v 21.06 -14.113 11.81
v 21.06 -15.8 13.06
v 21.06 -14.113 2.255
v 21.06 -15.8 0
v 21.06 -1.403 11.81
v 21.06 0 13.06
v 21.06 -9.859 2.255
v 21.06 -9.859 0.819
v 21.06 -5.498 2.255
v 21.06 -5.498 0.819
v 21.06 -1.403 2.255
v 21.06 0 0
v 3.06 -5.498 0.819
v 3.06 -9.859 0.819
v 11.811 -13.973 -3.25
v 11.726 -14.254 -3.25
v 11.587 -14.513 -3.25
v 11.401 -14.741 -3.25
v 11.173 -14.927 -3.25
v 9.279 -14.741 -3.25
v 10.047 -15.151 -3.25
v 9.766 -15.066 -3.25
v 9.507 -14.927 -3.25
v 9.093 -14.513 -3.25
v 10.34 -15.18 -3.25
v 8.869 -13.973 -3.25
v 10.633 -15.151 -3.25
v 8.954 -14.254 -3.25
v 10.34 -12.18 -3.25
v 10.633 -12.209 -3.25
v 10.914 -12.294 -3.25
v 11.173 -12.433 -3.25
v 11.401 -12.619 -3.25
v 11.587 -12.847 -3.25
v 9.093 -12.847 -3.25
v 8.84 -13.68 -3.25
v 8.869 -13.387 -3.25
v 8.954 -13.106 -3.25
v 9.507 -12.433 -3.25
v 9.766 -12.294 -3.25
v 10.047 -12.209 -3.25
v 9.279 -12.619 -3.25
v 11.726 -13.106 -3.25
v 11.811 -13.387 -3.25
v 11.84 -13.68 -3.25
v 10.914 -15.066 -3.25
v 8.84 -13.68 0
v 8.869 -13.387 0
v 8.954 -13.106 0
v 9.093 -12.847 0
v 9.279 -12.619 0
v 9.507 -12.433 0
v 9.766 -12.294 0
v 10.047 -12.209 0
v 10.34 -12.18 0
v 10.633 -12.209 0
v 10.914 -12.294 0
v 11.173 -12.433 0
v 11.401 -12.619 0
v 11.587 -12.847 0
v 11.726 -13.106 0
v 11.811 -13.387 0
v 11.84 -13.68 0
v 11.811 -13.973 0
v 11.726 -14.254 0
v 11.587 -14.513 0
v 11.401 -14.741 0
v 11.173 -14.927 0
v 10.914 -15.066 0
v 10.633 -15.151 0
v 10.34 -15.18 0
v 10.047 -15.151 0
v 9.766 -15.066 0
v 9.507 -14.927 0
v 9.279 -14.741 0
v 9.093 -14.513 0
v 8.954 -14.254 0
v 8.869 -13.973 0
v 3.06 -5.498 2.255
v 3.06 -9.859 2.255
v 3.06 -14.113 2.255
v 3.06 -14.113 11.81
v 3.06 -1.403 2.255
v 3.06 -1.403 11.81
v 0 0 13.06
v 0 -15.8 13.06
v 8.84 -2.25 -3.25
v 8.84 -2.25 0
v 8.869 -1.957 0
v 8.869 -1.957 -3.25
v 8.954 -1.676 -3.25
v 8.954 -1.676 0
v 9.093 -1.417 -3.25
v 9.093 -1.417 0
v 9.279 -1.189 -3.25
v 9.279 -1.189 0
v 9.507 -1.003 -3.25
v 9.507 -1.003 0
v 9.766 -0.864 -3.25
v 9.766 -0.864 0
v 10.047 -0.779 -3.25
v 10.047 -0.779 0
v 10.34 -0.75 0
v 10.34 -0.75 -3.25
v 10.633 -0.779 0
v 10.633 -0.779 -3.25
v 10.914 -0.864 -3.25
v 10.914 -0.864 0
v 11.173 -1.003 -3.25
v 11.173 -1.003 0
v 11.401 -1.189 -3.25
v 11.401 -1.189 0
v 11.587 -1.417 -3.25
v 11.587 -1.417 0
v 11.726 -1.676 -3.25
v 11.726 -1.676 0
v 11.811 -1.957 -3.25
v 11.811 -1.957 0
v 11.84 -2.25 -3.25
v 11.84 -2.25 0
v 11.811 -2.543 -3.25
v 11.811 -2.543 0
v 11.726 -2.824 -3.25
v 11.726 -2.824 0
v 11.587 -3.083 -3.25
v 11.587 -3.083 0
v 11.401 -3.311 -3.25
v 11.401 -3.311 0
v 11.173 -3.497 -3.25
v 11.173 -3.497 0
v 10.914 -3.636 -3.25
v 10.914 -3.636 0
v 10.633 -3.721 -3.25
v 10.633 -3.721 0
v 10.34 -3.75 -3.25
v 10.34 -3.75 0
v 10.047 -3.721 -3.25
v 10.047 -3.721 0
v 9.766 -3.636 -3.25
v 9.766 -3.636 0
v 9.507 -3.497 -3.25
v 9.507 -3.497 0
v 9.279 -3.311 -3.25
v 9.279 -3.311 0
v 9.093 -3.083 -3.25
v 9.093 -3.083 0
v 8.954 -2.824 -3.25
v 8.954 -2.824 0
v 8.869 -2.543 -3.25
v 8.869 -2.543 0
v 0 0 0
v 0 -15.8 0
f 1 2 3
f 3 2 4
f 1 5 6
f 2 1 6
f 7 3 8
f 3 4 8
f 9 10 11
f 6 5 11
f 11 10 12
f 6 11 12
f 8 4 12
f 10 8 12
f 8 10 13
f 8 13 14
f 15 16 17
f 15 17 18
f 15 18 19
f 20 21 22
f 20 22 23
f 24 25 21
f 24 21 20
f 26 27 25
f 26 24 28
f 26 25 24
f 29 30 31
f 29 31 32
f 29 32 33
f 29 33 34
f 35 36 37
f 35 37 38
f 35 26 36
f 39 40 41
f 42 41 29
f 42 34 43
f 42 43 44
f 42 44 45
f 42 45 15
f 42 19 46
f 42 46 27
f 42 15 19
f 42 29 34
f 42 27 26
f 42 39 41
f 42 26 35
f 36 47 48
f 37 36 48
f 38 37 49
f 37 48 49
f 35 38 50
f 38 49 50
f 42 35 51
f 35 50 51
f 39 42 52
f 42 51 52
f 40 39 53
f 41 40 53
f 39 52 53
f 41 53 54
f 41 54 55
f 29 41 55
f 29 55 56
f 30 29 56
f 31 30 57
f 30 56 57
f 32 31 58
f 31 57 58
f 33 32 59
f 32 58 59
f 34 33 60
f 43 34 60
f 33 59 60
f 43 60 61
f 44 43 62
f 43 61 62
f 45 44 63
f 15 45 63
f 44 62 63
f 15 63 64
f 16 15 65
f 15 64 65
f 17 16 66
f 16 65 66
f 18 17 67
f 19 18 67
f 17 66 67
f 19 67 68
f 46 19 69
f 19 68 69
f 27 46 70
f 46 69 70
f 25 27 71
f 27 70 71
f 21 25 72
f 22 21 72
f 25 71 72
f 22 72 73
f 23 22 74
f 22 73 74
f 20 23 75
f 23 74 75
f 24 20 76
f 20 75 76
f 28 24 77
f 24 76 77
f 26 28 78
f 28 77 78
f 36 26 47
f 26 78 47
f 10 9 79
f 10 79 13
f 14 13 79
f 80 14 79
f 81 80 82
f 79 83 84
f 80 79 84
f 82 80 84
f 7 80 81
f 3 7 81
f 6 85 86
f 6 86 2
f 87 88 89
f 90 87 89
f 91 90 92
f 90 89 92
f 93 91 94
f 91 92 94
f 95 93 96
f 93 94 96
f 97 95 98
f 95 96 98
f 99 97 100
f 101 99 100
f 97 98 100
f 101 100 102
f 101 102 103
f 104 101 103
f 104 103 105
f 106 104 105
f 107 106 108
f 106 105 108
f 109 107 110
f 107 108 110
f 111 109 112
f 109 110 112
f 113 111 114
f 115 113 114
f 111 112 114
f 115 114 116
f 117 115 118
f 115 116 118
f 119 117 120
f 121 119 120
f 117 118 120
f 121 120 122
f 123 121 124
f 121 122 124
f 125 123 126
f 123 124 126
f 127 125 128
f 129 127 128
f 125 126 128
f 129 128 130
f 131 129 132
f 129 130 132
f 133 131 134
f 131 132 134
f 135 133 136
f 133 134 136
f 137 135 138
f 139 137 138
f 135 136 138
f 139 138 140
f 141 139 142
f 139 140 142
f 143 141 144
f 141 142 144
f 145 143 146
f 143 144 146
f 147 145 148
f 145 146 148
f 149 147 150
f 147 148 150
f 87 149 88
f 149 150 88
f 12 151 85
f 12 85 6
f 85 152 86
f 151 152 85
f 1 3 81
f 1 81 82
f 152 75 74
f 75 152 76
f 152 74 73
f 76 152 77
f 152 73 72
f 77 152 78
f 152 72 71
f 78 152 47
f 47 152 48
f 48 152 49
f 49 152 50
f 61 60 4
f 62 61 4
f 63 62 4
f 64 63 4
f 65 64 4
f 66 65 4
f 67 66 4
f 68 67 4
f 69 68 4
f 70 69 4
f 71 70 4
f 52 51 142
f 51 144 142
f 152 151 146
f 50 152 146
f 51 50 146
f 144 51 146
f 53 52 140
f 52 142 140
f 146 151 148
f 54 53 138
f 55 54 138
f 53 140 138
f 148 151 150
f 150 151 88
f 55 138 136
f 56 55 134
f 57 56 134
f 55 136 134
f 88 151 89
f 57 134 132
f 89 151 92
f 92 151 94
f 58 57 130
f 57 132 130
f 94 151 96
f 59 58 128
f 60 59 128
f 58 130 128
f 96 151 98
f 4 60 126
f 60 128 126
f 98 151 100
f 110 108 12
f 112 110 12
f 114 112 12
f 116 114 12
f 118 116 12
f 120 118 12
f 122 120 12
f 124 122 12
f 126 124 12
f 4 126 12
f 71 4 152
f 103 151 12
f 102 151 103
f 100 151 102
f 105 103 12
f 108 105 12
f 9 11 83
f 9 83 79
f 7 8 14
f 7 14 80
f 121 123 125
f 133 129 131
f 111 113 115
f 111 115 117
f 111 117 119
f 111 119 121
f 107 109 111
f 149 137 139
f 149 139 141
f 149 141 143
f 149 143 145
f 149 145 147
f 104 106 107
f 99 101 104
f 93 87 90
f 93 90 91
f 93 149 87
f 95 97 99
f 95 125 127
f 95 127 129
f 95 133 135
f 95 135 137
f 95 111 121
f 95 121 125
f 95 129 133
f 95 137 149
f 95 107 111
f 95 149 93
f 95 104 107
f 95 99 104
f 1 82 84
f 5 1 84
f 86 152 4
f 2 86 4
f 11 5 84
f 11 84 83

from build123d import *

# Parameters (mm, degrees)
SKETCH1_W          = 21.06
SKETCH1_H          = 15.8
EXTRUDE1_DEPTH     = 13.06
SKETCH2_R          = 1.5
EXTRUDE2_DEPTH     = 3.25
CUT_EXTRUDE1_DEPTH = 18


with BuildPart() as part:
    # Sketch1 → Extrude1 (new body)
    with BuildSketch(Plane.XY):
        with Locations((10.53, -7.9)):
            Rectangle(SKETCH1_W, SKETCH1_H)
    extrude(amount=EXTRUDE1_DEPTH)

    # Sketch2 → Extrude2 (add)
    with BuildSketch(Plane(origin=(0, 0, 0), x_dir=(-1, 0, 0), z_dir=(0, 0, -1))):
        with Locations((-10.34, -2.25)):
            Circle(SKETCH2_R)
        with Locations((-10.34, -13.68)):
            Circle(SKETCH2_R)
    extrude(amount=EXTRUDE2_DEPTH)

    # Sketch3 → Cut-Extrude1 (cut)
    with BuildSketch(Plane(origin=(21.06, 0, 0), x_dir=(0, 0, -1), z_dir=(1, 0, 0))):
        Polygon((-11.809509458, -14.113172182), (-11.809509458, -1.403202269), (-2.254873777, -1.403202269), (-2.254873777, -5.498046132), (-0.819019435, -5.498046132), (-0.819019435, -9.858788948), (-2.254873777, -9.858788948), (-2.254873777, -14.113172182), align=None)
    extrude(amount=-CUT_EXTRUDE1_DEPTH, mode=Mode.SUBTRACT)


solid = part.part
